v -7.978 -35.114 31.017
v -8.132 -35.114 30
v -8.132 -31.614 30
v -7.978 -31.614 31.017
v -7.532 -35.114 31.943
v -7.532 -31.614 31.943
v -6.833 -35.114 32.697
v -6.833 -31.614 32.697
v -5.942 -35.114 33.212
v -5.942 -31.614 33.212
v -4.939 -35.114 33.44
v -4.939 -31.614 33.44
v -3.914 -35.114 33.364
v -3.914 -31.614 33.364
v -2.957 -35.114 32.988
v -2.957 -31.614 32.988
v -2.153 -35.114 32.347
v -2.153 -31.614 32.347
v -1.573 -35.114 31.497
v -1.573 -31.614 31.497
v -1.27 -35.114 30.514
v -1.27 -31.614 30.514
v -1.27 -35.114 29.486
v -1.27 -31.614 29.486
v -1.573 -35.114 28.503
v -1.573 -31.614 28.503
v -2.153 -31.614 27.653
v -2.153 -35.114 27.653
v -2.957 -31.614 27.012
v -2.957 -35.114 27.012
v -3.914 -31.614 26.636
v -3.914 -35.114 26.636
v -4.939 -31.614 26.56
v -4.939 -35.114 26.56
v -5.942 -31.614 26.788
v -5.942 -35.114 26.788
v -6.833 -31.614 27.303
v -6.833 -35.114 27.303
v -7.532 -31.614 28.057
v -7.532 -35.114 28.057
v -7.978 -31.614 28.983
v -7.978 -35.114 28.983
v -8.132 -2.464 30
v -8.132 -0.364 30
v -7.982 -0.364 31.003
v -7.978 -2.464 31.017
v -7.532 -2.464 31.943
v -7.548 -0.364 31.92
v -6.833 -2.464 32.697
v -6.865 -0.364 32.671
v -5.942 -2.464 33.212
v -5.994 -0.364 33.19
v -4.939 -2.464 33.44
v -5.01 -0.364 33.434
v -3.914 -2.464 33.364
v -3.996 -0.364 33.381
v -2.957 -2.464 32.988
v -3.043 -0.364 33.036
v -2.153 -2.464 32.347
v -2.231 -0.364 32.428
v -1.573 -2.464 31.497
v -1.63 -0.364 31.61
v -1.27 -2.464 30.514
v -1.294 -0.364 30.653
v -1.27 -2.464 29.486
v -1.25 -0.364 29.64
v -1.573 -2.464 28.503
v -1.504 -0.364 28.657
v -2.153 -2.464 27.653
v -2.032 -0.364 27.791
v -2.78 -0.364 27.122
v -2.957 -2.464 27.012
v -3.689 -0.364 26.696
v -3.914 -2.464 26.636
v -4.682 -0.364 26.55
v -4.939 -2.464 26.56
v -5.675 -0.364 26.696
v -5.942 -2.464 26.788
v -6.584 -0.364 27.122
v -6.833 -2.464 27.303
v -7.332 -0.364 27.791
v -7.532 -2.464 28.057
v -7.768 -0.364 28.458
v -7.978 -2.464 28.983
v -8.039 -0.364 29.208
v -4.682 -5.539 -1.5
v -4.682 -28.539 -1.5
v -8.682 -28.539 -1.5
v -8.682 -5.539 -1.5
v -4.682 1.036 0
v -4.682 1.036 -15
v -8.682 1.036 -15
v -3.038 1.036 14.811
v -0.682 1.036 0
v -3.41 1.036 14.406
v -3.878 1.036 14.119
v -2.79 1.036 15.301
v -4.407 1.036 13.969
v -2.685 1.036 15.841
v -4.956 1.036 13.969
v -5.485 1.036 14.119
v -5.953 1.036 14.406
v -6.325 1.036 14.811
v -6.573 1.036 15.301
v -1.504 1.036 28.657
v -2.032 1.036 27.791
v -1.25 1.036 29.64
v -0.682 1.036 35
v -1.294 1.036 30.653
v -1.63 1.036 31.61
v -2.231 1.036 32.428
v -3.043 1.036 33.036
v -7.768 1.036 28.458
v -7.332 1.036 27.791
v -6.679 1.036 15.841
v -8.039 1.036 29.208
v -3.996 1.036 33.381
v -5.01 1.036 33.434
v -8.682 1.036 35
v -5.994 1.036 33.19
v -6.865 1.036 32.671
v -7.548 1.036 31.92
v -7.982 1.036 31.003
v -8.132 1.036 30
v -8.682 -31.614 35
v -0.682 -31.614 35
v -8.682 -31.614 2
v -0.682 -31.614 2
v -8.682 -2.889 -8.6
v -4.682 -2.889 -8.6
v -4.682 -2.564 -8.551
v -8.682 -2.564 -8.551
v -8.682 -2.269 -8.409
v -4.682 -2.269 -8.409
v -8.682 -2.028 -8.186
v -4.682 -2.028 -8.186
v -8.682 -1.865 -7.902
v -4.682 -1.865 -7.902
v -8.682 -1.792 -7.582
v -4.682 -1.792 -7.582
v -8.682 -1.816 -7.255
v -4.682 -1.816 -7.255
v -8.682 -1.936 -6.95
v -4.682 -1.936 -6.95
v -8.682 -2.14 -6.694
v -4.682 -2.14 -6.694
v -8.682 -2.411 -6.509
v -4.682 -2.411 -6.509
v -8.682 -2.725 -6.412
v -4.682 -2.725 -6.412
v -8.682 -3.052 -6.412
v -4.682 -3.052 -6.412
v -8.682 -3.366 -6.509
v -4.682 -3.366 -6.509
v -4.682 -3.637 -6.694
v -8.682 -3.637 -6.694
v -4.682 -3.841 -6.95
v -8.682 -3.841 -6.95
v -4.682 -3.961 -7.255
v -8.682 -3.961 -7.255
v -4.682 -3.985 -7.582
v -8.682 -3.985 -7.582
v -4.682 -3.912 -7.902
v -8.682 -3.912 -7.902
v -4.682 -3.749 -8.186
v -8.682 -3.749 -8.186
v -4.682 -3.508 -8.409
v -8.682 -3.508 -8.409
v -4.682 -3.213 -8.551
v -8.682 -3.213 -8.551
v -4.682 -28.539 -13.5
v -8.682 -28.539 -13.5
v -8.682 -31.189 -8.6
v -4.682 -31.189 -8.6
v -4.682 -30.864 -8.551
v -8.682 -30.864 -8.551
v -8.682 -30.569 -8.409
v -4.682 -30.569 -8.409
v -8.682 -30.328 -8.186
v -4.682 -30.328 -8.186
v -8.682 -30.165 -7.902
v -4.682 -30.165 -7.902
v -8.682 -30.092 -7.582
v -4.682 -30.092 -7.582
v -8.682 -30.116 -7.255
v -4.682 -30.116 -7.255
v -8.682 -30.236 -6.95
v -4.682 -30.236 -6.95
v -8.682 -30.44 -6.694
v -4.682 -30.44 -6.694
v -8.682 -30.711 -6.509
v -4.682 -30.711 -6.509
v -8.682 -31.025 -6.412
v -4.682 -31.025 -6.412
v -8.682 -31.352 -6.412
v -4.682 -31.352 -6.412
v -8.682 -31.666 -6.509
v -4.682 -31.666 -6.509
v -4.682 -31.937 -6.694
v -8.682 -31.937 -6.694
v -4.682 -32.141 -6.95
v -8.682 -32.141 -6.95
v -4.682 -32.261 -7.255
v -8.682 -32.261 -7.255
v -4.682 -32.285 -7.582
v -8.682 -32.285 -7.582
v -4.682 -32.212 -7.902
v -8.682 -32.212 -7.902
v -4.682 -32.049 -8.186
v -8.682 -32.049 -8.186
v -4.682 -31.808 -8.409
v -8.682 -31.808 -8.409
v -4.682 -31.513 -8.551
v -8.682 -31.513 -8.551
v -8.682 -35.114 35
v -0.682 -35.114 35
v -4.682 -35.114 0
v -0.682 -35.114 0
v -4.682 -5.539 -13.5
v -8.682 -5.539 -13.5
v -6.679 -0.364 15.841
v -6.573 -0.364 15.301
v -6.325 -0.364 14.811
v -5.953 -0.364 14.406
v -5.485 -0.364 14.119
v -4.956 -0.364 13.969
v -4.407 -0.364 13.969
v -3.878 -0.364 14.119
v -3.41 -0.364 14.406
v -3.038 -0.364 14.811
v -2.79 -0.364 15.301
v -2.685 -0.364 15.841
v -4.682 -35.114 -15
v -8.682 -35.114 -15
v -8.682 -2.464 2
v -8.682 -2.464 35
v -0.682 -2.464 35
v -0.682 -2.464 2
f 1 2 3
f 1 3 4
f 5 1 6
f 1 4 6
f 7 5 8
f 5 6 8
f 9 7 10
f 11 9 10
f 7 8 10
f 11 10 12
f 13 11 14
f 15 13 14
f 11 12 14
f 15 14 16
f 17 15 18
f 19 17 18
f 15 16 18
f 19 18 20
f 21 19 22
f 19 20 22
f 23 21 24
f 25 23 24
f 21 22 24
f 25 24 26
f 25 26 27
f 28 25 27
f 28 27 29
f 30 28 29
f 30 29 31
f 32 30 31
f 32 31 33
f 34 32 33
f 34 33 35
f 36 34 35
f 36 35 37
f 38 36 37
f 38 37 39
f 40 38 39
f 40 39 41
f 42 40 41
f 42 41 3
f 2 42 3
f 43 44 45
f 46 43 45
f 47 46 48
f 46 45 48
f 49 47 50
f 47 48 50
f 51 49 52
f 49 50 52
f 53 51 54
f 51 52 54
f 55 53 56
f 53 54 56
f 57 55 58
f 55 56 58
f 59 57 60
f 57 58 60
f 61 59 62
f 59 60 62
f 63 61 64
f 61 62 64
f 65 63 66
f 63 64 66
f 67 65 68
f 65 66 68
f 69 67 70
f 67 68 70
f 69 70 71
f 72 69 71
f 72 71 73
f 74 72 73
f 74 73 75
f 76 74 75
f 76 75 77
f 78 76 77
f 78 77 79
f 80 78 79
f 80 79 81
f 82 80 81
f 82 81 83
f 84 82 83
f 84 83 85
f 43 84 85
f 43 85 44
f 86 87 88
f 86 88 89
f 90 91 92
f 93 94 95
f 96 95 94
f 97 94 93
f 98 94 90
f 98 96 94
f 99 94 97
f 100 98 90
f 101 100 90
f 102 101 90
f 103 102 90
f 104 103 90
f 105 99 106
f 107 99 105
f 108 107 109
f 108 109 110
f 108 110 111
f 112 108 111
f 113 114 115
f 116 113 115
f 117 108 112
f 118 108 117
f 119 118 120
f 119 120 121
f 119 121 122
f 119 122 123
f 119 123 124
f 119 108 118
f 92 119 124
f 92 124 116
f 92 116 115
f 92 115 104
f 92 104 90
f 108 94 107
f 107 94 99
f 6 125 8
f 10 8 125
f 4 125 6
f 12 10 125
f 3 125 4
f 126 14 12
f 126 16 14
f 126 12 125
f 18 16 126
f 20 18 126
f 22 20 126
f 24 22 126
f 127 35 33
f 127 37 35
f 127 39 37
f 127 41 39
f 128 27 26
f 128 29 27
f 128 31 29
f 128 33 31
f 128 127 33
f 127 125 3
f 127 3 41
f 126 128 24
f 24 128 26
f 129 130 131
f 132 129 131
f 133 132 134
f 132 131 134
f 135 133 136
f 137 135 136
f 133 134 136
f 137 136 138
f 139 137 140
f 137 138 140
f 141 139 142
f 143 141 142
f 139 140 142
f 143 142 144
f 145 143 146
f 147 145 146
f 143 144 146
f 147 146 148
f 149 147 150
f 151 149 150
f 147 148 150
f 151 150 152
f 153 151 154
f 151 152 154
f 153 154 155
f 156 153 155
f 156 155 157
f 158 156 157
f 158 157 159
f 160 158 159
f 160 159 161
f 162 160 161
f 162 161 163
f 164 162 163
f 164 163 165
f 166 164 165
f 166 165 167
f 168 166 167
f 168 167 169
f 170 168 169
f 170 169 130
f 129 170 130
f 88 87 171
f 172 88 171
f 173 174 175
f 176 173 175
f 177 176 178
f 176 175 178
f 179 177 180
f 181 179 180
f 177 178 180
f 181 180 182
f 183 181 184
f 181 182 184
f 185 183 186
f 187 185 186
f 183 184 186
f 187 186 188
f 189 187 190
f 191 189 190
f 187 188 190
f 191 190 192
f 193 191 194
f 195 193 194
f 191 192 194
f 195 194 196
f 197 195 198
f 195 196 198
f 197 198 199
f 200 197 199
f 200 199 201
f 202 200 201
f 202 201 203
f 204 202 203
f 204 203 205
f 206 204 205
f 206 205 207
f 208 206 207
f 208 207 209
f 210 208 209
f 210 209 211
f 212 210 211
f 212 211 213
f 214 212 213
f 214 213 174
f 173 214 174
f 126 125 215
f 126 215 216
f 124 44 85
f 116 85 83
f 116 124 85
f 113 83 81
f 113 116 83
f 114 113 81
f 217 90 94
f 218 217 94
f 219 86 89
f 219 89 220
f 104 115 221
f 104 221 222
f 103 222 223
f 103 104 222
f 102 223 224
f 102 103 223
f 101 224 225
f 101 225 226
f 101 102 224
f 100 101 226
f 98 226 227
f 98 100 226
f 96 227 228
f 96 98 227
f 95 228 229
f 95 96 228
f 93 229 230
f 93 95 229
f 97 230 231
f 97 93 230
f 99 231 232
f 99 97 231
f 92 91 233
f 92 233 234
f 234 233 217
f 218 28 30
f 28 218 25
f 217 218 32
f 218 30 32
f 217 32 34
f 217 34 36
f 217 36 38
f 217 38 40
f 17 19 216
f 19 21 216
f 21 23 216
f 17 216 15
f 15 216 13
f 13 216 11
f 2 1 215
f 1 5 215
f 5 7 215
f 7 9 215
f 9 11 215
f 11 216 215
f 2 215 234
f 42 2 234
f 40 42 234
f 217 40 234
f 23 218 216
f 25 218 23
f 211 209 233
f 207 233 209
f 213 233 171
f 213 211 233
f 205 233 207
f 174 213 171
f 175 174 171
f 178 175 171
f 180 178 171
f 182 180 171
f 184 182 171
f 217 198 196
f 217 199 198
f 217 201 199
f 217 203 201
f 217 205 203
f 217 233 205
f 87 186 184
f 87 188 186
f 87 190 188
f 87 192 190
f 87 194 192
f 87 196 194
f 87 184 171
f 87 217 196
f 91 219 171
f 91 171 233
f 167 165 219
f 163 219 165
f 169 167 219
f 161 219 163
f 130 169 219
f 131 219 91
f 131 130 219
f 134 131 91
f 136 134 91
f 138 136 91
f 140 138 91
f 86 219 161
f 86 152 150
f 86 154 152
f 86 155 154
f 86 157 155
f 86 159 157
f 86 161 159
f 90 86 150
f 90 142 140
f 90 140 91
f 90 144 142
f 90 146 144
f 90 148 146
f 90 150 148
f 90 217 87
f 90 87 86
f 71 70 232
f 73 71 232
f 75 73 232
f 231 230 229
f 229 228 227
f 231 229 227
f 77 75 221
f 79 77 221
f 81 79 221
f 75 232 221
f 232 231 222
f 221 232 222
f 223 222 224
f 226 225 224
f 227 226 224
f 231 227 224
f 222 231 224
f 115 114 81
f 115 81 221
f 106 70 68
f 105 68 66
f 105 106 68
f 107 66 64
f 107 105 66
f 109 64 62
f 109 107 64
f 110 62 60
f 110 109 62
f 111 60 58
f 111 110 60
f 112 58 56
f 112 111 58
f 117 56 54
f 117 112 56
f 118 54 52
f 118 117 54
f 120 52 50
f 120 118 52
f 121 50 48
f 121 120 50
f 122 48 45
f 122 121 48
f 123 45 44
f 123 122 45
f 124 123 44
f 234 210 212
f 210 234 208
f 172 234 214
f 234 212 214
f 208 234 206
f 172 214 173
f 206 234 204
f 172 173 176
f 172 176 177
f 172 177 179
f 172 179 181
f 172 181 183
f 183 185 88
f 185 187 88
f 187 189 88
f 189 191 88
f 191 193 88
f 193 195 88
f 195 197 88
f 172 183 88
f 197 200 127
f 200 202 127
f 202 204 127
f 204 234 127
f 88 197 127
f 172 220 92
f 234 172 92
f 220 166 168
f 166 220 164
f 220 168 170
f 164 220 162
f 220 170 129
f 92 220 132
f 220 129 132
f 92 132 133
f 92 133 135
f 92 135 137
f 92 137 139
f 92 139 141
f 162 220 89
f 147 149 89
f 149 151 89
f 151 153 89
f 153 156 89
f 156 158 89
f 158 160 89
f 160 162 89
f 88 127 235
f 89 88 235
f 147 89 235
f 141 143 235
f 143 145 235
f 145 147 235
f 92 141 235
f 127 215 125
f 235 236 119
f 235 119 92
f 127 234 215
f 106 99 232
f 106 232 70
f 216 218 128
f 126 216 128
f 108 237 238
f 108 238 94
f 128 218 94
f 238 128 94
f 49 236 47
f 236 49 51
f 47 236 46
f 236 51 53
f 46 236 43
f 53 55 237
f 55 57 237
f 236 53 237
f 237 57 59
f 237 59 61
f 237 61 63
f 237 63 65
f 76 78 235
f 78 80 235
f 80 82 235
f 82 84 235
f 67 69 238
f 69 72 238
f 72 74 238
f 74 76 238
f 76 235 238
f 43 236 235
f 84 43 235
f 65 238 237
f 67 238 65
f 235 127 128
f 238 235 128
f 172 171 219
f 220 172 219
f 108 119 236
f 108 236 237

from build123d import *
from build123d.topology import SkipClean

# Parameters (mm, degrees)
SKETCH2_W             = 8
SKETCH2_H             = 3.5
BOSS_EXTRUDE2_DEPTH   = 35
BOSS_EXTRUDE2_2_DEPTH = 35
SKETCH2_3_W           = 8
SKETCH2_3_H           = 29.15
BOSS_EXTRUDE3_DEPTH   = 2
SKETCH7_W             = 4
SKETCH7_H             = 36.15
BOSS_EXTRUDE4_DEPTH   = 15
CUT_EXTRUDE5_REACH    = 51.739
SKETCH8_R             = 1.1
SKETCH8_W             = 12
SKETCH8_H             = 23
CUT_EXTRUDE6_DEPTH    = 1.4
SKETCH10_R            = 3.45
CUT_EXTRUDE7_DEPTH    = 52.060667156


with BuildPart() as part:
    # Sketch2 → Boss-Extrude2 (new body)
    with BuildSketch(Plane.XY):
        with Locations((-4.681545395, -0.713506952)):
            Rectangle(SKETCH2_W, SKETCH2_H)
    extrude(amount=BOSS_EXTRUDE2_DEPTH)

    # Sketch2<3> → Boss-Extrude3 (add)
    with BuildSketch(Plane.XY):
        with Locations((-4.681545395, -17.038506952)):
            Rectangle(SKETCH2_3_W, SKETCH2_3_H)
    extrude(amount=BOSS_EXTRUDE3_DEPTH)



with BuildPart() as body_2:
    # Sketch2 → Boss-Extrude2 2 (new body)
    with BuildSketch(Plane.XY):
        with Locations((-4.681545395, -33.363506952)):
            Rectangle(SKETCH2_W, SKETCH2_H)
    extrude(amount=BOSS_EXTRUDE2_2_DEPTH)


with BuildPart() as part_1:
    add(part.part)

    add(body_2.part)  # Boss-Extrude4 merges body 2
    # Sketch7 → Boss-Extrude4 (add)
    with BuildSketch(Plane(origin=(0, 0, 0), x_dir=(-1, 0, 0), z_dir=(0, 0, -1))):
        with Locations((6.681545395, -17.038506952)):
            Rectangle(SKETCH7_W, SKETCH7_H)
    extrude(amount=BOSS_EXTRUDE4_DEPTH)

    # Sketch8 → Cut-Extrude5 (cut, up to next)
    with BuildSketch(Plane(origin=(-4.681545395, 0, 0), x_dir=(0, 0, -1), z_dir=(1, 0, 0)), mode=Mode.PRIVATE) as cut_extrude5_sk1:
        with Locations((7.5, -2.888506952)):
            Circle(SKETCH8_R)
    cut_extrude5_tool1 = extrude(cut_extrude5_sk1.sketch, amount=-CUT_EXTRUDE5_REACH, mode=Mode.PRIVATE) & part_1.part
    # Sketch8 → Cut-Extrude5 (cut, up to next)
    with BuildSketch(Plane(origin=(-4.681545395, 0, 0), x_dir=(0, 0, -1), z_dir=(1, 0, 0)), mode=Mode.PRIVATE) as cut_extrude5_sk2:
        with Locations((7.5, -31.188506952)):
            Circle(SKETCH8_R)
    cut_extrude5_tool2 = extrude(cut_extrude5_sk2.sketch, amount=-CUT_EXTRUDE5_REACH, mode=Mode.PRIVATE) & part_1.part
    # Sketch8 → Cut-Extrude5 (cut, up to next)
    with BuildSketch(Plane(origin=(-4.681545395, 0, 0), x_dir=(0, 0, -1), z_dir=(1, 0, 0)), mode=Mode.PRIVATE) as cut_extrude5_sk3:
        with Locations((7.5, -17.038506952)):
            Rectangle(SKETCH8_W, SKETCH8_H)
    cut_extrude5_tool3 = extrude(cut_extrude5_sk3.sketch, amount=-CUT_EXTRUDE5_REACH, mode=Mode.PRIVATE) & part_1.part
    add(cut_extrude5_tool1.solids().sort_by_distance((-4.681545, -2.888507, -7.5))[0], mode=Mode.SUBTRACT)
    add(cut_extrude5_tool2.solids().sort_by_distance((-4.681545, -31.188507, -7.5))[0], mode=Mode.SUBTRACT)
    add(cut_extrude5_tool3.solids().sort_by_distance((-4.681545, -17.038507, -7.5))[0], mode=Mode.SUBTRACT)

    # Sketch9 → Cut-Extrude6 (cut)
    with BuildSketch(Plane(origin=(0, 1.036493048, 0), x_dir=(1, 0, 0), z_dir=(0, 1, 0))):
        with BuildLine():
            Line((-2.684524514, -15.840878033), (-2.031545395, -27.790927797))
            ThreePointArc((-2.031545395, -27.790927797), (-4.681545395, -33.45), (-7.331545395, -27.790927797))
            Line((-7.331545395, -27.790927797), (-6.678566275, -15.840878033))
            ThreePointArc((-6.678566275, -15.840878033), (-4.681545395, -13.95), (-2.684524514, -15.840878033))
        make_face()
    extrude(amount=-CUT_EXTRUDE6_DEPTH, mode=Mode.SUBTRACT)

    # Sketch10 → Cut-Extrude7 (cut, through all)
    with SkipClean():  # the faces are left unmerged after this step: merging them gives an invalid solid
        with BuildSketch(Plane(origin=(0, 1.036493048, 0), x_dir=(1, 0, 0), z_dir=(0, 1, 0))):
            with Locations((-4.681545395, -30)):
                Circle(SKETCH10_R)
        extrude(amount=-CUT_EXTRUDE7_DEPTH, mode=Mode.SUBTRACT)


solid = part_1.part
